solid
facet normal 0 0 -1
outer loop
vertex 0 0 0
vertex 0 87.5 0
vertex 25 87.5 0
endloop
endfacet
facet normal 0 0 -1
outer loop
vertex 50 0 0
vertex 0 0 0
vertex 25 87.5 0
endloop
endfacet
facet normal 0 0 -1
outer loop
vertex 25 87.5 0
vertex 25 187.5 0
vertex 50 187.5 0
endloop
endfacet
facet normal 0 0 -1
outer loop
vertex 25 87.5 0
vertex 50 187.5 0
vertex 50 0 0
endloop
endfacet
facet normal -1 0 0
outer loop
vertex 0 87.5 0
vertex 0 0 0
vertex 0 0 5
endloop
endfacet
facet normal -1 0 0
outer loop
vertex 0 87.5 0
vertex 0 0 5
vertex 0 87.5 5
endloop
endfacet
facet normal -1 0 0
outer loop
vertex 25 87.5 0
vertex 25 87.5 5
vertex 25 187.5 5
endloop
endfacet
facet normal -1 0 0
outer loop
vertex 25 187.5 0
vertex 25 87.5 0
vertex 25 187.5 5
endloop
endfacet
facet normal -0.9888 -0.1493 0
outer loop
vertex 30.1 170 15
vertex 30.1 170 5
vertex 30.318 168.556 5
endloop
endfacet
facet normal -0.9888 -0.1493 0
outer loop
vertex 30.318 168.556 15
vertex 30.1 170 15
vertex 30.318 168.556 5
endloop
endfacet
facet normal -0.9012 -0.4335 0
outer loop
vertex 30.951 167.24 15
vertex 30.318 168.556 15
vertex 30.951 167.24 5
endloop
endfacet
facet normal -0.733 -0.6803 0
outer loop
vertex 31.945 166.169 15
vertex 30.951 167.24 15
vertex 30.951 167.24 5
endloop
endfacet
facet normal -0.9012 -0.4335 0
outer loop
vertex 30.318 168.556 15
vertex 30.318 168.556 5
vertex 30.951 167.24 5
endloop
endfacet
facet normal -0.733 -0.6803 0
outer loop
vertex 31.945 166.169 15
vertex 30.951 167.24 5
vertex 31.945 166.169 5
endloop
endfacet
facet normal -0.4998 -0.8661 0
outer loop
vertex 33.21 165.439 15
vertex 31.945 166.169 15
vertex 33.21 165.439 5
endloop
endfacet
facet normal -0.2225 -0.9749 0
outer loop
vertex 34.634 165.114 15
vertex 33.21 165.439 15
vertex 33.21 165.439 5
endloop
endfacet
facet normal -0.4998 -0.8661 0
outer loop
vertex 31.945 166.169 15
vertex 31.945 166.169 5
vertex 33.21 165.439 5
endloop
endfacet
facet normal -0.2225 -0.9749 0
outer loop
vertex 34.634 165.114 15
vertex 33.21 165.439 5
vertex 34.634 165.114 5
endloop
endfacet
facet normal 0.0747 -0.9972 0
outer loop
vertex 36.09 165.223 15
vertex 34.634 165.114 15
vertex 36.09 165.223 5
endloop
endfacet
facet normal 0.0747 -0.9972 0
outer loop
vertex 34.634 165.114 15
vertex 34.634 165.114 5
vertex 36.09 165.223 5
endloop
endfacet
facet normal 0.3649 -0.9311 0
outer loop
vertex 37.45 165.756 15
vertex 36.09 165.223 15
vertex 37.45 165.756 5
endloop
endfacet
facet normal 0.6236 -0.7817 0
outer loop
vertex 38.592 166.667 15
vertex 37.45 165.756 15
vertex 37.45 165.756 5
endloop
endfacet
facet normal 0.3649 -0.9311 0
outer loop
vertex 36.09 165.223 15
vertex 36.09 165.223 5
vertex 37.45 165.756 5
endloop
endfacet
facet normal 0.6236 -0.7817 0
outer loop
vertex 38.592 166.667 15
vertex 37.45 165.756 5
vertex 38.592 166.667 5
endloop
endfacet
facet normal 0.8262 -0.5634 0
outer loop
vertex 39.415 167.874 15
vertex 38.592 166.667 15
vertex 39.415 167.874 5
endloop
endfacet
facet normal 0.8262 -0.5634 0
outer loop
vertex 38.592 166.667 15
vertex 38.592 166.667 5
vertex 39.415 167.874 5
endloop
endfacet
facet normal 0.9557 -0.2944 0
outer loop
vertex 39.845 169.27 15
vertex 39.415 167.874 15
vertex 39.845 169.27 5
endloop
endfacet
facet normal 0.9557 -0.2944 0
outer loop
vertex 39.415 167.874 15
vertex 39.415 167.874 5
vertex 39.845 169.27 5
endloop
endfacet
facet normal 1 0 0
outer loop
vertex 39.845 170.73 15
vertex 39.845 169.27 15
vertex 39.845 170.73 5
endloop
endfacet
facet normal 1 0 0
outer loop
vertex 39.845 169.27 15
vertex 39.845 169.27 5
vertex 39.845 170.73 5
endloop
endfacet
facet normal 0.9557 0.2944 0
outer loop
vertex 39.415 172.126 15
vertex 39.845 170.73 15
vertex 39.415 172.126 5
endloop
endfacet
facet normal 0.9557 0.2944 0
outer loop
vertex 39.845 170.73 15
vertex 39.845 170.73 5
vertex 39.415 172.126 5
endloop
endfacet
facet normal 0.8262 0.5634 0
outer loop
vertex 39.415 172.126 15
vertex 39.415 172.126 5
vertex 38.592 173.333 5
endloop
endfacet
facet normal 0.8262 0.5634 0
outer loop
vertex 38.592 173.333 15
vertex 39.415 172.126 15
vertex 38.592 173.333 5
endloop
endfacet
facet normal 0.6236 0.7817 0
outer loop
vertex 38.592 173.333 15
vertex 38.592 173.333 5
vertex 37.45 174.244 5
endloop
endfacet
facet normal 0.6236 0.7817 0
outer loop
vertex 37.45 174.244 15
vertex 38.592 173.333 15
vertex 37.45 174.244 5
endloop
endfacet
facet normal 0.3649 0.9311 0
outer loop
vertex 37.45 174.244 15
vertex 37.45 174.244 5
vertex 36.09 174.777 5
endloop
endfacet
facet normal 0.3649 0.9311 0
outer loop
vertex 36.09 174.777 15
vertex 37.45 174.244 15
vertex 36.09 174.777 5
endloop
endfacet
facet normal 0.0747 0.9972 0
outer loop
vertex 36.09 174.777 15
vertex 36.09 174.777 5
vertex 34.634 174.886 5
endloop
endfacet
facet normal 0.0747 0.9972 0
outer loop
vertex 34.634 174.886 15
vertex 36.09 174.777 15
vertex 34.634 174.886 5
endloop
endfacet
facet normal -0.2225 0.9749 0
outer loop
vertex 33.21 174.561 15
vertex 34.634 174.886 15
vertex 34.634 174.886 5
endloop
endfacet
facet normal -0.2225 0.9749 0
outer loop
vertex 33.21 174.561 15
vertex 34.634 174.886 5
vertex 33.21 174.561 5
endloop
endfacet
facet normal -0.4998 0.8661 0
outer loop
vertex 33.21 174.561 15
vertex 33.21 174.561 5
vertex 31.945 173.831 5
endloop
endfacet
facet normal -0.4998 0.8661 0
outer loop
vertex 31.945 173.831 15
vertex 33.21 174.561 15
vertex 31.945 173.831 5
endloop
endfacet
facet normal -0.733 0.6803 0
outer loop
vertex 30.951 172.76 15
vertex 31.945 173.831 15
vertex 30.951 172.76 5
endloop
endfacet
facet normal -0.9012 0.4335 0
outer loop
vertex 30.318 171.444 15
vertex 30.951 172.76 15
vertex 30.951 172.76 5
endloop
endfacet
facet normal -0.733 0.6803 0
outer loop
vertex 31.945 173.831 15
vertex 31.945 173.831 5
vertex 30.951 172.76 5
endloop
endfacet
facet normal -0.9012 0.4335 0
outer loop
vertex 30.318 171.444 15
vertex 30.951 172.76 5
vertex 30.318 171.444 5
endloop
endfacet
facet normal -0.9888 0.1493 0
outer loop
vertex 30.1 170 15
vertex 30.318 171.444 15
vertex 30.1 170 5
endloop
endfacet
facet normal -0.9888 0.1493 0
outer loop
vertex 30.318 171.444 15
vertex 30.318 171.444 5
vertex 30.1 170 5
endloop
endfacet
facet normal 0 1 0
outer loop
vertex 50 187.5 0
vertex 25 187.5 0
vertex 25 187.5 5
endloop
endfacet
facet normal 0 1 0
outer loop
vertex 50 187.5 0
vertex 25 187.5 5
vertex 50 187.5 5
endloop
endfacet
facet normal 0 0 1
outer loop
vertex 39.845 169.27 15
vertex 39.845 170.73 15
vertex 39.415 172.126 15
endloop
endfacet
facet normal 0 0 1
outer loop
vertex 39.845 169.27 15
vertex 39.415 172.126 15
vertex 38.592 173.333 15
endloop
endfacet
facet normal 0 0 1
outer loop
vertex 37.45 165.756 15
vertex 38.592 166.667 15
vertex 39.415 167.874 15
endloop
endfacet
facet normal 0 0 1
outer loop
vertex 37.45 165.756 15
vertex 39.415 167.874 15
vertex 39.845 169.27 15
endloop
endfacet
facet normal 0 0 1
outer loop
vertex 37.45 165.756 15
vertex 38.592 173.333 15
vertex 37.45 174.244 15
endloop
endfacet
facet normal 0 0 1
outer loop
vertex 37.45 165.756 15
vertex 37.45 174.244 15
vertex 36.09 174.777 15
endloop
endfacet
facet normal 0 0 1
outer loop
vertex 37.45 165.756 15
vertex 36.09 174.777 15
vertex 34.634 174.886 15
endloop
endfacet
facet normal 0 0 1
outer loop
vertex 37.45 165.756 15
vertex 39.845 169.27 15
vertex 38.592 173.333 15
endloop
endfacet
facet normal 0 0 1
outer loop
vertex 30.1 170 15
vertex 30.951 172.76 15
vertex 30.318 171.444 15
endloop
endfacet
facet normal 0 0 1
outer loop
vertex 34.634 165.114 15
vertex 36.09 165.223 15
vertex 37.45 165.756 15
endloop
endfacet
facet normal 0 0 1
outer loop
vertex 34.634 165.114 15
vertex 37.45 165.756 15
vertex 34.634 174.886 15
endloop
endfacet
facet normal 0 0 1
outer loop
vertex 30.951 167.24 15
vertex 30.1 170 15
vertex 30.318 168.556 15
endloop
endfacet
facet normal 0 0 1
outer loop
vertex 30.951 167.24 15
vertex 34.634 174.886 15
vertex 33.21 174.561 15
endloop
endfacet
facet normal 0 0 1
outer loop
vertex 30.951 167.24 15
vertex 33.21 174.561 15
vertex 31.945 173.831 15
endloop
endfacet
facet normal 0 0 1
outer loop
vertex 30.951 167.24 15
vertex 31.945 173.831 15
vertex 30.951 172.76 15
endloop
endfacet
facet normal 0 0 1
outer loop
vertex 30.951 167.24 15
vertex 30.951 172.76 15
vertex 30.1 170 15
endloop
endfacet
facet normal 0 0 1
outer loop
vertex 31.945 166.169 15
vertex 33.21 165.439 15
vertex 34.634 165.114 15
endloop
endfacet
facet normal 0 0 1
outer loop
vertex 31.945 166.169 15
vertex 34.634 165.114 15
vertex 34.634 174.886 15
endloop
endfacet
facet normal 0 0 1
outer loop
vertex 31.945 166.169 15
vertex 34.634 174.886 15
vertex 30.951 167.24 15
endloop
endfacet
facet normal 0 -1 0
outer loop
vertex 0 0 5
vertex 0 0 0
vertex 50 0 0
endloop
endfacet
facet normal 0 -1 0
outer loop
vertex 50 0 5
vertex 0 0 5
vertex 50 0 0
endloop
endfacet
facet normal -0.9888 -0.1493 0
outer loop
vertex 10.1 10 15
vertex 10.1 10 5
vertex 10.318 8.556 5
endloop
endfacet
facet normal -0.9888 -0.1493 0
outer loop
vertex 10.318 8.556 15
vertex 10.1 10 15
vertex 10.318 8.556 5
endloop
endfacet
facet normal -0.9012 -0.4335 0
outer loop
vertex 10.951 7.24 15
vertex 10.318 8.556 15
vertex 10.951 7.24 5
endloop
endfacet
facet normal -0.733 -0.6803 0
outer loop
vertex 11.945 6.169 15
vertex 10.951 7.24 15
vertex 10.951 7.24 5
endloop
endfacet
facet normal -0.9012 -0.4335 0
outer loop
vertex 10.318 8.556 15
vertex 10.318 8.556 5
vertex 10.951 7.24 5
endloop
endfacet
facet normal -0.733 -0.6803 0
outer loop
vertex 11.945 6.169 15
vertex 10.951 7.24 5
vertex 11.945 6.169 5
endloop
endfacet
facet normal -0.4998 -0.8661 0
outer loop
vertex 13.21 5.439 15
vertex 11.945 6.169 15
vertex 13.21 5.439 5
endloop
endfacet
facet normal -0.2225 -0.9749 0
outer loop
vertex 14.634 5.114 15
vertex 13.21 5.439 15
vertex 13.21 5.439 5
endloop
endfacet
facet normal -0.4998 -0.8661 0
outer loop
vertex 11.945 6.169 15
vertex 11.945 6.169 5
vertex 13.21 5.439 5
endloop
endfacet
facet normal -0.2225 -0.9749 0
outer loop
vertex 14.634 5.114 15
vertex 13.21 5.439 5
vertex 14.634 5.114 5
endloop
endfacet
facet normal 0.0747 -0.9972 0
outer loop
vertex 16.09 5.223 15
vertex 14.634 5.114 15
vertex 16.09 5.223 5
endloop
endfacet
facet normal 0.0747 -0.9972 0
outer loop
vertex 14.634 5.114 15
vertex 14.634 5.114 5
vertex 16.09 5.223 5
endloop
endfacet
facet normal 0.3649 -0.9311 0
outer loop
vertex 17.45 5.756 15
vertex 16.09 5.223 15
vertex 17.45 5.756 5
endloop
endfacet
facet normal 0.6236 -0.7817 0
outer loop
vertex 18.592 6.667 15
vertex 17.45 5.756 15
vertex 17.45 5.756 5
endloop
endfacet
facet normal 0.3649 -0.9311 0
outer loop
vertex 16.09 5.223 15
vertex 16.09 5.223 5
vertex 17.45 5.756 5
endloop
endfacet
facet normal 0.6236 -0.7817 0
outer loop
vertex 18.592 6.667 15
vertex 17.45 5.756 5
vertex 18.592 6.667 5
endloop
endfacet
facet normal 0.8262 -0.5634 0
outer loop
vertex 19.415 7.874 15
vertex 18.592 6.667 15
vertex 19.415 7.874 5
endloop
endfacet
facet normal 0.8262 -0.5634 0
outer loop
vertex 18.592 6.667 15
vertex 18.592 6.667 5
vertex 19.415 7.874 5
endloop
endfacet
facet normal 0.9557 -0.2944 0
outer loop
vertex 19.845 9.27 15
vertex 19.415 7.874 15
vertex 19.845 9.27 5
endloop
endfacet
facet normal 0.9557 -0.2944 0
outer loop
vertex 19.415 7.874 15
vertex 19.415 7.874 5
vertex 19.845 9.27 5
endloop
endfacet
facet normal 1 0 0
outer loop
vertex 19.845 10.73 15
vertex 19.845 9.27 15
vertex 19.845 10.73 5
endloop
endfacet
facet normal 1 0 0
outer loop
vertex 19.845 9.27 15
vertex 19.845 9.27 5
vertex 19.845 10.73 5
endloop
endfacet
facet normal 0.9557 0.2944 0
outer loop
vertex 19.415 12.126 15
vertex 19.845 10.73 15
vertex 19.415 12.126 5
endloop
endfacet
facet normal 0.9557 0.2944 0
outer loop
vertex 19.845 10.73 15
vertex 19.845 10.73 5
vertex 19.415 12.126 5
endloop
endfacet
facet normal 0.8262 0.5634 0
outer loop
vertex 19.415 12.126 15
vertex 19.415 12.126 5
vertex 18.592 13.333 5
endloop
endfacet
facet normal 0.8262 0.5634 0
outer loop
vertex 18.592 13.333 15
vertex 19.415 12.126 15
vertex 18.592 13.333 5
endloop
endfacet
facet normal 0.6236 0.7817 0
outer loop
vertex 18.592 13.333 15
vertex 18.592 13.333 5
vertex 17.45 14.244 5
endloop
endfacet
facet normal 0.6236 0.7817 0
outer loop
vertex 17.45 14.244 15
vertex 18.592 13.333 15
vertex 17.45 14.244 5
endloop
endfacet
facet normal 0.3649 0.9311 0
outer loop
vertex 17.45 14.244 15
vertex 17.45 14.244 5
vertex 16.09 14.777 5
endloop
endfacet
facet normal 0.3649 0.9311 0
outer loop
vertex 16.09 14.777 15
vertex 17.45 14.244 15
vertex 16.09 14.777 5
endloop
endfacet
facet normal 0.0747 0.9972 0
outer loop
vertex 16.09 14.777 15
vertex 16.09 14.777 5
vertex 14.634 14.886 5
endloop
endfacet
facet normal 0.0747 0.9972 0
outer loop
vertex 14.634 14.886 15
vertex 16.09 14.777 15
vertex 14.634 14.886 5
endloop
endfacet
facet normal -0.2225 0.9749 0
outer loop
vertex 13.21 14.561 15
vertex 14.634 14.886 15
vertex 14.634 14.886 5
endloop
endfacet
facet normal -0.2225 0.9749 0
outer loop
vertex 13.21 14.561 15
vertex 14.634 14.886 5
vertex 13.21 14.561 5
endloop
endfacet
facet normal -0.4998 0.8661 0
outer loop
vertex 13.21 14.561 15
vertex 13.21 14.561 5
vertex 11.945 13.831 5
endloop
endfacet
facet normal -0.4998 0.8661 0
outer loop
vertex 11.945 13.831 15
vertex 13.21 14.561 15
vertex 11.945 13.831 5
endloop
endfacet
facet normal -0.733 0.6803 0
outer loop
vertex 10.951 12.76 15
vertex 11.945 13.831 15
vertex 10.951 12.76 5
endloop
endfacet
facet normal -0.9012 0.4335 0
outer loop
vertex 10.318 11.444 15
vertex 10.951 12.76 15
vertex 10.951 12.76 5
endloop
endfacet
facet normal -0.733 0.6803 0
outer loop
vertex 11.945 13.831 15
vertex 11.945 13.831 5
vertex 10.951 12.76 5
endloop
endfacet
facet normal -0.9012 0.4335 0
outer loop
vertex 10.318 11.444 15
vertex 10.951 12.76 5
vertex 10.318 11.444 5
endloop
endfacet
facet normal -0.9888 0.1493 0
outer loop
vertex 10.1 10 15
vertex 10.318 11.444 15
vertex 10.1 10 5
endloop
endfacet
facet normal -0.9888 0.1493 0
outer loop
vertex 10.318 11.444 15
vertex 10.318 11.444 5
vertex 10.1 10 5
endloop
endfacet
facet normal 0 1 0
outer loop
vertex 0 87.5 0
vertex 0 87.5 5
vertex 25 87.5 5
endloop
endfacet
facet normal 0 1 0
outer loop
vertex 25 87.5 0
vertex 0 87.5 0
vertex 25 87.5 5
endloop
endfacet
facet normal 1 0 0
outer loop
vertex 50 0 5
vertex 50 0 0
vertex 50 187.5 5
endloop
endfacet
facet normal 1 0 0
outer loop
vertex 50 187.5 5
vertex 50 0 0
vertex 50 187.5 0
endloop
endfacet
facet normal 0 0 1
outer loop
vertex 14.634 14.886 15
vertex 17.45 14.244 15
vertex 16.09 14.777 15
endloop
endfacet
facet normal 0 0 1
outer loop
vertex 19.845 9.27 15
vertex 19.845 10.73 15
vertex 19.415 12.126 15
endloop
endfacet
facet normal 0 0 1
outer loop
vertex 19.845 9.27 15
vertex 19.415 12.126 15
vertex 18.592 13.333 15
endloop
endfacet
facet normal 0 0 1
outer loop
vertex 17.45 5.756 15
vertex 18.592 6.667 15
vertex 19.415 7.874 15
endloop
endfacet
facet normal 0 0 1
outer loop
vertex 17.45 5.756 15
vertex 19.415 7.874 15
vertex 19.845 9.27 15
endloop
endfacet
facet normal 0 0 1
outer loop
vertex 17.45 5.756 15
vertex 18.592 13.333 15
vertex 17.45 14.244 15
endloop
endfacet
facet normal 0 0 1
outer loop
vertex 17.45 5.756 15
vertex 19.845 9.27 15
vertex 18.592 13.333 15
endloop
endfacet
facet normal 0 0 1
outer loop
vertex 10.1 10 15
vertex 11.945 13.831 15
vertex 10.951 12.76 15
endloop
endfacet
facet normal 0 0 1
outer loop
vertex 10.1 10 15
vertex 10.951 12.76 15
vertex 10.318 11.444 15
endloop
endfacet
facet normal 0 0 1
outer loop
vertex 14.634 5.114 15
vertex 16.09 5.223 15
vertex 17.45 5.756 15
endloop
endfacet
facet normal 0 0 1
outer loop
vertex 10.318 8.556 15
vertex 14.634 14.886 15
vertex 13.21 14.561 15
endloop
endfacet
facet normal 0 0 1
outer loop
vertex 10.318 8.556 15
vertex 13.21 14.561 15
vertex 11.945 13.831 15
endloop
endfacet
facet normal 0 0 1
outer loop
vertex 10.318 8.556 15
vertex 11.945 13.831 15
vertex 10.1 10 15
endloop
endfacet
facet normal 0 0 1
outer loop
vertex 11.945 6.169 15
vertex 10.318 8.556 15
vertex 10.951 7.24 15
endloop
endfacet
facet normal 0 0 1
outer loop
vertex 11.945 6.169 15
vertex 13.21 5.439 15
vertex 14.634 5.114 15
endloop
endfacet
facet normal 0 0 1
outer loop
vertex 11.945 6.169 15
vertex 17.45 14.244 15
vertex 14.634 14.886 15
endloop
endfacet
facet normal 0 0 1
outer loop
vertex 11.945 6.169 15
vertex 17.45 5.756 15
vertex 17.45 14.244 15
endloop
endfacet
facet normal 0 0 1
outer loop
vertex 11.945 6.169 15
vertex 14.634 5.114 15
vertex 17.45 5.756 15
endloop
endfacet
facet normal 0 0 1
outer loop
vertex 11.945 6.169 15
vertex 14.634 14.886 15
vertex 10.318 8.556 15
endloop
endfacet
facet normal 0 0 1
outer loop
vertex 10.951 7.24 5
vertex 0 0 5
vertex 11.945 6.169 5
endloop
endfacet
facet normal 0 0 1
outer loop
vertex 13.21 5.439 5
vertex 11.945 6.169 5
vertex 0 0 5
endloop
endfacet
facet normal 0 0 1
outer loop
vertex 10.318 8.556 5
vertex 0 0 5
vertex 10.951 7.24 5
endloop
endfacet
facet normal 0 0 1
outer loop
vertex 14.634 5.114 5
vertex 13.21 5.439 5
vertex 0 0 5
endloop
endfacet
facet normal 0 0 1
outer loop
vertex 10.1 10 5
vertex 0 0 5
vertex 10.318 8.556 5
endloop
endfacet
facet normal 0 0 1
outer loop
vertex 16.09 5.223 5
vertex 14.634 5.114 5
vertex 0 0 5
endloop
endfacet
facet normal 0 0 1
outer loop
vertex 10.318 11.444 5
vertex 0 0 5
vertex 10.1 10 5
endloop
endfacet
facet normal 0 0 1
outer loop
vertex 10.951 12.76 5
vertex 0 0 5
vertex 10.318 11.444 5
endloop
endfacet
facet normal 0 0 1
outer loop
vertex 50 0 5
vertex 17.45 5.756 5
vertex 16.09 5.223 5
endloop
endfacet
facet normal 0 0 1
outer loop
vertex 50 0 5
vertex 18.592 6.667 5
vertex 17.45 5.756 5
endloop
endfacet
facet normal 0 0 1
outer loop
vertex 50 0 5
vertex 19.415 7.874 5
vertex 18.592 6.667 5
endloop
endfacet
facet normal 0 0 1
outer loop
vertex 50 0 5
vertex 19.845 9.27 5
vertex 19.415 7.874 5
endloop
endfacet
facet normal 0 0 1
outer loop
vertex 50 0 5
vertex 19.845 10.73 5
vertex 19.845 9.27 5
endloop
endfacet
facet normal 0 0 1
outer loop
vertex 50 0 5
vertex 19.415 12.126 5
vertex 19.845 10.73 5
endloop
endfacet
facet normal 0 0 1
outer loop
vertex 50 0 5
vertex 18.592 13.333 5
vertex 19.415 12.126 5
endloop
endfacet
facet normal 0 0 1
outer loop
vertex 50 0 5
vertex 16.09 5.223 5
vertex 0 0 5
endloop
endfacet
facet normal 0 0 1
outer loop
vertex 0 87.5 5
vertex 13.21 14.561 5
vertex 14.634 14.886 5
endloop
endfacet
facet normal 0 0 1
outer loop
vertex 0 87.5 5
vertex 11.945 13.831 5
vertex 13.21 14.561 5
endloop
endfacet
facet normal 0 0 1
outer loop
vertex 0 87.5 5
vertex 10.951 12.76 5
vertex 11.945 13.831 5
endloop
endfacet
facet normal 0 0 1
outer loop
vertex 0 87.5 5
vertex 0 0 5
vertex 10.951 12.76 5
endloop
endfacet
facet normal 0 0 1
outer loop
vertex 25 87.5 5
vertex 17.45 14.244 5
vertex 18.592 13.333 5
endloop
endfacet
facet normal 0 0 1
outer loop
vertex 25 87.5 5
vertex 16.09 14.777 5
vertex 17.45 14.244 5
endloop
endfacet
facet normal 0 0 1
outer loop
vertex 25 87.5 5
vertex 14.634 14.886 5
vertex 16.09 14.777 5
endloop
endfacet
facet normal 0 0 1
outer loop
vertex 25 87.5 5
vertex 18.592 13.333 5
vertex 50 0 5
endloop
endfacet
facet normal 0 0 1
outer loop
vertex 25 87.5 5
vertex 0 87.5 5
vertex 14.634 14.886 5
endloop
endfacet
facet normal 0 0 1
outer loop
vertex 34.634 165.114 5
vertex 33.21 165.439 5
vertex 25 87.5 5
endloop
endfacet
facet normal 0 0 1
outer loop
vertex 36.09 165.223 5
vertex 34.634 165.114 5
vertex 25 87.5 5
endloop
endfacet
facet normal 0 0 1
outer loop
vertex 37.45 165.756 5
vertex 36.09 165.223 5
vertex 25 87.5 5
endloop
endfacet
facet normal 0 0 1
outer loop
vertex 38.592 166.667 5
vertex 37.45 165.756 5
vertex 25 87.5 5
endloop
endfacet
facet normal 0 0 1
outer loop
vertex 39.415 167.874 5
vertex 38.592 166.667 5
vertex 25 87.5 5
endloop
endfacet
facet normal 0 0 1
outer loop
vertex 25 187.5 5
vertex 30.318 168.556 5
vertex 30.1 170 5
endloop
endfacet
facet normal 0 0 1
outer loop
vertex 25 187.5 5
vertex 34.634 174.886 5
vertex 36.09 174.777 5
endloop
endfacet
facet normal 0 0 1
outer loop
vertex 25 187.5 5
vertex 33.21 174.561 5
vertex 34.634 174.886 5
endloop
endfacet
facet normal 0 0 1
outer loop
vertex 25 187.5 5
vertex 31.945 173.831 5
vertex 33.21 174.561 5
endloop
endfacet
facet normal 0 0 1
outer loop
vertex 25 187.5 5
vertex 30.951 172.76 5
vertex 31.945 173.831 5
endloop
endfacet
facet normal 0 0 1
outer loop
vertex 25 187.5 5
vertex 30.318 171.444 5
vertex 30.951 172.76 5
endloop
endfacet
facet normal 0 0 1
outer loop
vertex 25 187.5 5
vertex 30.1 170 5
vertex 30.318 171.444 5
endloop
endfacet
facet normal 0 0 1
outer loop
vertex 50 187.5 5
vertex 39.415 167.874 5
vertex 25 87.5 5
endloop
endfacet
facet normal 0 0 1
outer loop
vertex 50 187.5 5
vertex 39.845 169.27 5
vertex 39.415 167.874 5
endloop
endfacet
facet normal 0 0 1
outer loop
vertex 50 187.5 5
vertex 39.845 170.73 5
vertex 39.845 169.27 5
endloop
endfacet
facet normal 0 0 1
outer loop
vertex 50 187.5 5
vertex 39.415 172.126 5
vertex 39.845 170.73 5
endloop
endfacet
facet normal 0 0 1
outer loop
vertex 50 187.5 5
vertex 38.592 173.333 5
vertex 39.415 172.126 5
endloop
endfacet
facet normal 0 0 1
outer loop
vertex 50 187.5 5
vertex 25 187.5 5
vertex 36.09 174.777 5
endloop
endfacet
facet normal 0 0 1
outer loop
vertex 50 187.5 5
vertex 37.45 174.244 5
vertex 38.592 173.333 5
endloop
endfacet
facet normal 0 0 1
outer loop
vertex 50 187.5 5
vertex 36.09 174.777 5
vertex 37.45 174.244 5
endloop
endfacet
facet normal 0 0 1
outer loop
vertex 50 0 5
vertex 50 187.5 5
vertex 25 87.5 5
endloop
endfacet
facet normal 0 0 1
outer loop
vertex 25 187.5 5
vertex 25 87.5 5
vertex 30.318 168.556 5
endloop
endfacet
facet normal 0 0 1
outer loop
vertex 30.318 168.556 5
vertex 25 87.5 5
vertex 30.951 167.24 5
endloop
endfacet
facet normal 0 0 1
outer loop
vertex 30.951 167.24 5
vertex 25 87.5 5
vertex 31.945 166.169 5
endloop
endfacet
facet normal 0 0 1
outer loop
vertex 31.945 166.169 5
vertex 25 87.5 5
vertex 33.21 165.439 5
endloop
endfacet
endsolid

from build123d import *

# Parameters (mm, degrees)
SKETCH1_W           = 50
SKETCH1_H           = 187.5
BOSS_EXTRUDE1_DEPTH = 5
SKETCH2_R           = 4.9
BOSS_EXTRUDE2_DEPTH = 10
SKETCH3_W           = 25
SKETCH3_H           = 100
CUT_EXTRUDE1_DEPTH  = 10


with BuildPart() as part:
    # Sketch1 → Boss-Extrude1 (new body)
    with BuildSketch(Plane.XY):
        with Locations((25, 93.75)):
            Rectangle(SKETCH1_W, SKETCH1_H)
    extrude(amount=BOSS_EXTRUDE1_DEPTH)

    # Sketch2 → Boss-Extrude2 (add)
    with BuildSketch(Plane.XY.offset(5)):
        with Locations(Location((15, 10, 0), (0, 0, 180))):
            Circle(SKETCH2_R)
        with Locations(Location((35, 170, 0), (0, 0, 180))):
            Circle(SKETCH2_R)
    extrude(amount=BOSS_EXTRUDE2_DEPTH)

    # Sketch3 → Cut-Extrude1 (cut)
    with BuildSketch(Plane.XY.offset(5)):
        with Locations((12.5, 137.5)):
            Rectangle(SKETCH3_W, SKETCH3_H)
    extrude(amount=-CUT_EXTRUDE1_DEPTH, mode=Mode.SUBTRACT)


solid = part.part
